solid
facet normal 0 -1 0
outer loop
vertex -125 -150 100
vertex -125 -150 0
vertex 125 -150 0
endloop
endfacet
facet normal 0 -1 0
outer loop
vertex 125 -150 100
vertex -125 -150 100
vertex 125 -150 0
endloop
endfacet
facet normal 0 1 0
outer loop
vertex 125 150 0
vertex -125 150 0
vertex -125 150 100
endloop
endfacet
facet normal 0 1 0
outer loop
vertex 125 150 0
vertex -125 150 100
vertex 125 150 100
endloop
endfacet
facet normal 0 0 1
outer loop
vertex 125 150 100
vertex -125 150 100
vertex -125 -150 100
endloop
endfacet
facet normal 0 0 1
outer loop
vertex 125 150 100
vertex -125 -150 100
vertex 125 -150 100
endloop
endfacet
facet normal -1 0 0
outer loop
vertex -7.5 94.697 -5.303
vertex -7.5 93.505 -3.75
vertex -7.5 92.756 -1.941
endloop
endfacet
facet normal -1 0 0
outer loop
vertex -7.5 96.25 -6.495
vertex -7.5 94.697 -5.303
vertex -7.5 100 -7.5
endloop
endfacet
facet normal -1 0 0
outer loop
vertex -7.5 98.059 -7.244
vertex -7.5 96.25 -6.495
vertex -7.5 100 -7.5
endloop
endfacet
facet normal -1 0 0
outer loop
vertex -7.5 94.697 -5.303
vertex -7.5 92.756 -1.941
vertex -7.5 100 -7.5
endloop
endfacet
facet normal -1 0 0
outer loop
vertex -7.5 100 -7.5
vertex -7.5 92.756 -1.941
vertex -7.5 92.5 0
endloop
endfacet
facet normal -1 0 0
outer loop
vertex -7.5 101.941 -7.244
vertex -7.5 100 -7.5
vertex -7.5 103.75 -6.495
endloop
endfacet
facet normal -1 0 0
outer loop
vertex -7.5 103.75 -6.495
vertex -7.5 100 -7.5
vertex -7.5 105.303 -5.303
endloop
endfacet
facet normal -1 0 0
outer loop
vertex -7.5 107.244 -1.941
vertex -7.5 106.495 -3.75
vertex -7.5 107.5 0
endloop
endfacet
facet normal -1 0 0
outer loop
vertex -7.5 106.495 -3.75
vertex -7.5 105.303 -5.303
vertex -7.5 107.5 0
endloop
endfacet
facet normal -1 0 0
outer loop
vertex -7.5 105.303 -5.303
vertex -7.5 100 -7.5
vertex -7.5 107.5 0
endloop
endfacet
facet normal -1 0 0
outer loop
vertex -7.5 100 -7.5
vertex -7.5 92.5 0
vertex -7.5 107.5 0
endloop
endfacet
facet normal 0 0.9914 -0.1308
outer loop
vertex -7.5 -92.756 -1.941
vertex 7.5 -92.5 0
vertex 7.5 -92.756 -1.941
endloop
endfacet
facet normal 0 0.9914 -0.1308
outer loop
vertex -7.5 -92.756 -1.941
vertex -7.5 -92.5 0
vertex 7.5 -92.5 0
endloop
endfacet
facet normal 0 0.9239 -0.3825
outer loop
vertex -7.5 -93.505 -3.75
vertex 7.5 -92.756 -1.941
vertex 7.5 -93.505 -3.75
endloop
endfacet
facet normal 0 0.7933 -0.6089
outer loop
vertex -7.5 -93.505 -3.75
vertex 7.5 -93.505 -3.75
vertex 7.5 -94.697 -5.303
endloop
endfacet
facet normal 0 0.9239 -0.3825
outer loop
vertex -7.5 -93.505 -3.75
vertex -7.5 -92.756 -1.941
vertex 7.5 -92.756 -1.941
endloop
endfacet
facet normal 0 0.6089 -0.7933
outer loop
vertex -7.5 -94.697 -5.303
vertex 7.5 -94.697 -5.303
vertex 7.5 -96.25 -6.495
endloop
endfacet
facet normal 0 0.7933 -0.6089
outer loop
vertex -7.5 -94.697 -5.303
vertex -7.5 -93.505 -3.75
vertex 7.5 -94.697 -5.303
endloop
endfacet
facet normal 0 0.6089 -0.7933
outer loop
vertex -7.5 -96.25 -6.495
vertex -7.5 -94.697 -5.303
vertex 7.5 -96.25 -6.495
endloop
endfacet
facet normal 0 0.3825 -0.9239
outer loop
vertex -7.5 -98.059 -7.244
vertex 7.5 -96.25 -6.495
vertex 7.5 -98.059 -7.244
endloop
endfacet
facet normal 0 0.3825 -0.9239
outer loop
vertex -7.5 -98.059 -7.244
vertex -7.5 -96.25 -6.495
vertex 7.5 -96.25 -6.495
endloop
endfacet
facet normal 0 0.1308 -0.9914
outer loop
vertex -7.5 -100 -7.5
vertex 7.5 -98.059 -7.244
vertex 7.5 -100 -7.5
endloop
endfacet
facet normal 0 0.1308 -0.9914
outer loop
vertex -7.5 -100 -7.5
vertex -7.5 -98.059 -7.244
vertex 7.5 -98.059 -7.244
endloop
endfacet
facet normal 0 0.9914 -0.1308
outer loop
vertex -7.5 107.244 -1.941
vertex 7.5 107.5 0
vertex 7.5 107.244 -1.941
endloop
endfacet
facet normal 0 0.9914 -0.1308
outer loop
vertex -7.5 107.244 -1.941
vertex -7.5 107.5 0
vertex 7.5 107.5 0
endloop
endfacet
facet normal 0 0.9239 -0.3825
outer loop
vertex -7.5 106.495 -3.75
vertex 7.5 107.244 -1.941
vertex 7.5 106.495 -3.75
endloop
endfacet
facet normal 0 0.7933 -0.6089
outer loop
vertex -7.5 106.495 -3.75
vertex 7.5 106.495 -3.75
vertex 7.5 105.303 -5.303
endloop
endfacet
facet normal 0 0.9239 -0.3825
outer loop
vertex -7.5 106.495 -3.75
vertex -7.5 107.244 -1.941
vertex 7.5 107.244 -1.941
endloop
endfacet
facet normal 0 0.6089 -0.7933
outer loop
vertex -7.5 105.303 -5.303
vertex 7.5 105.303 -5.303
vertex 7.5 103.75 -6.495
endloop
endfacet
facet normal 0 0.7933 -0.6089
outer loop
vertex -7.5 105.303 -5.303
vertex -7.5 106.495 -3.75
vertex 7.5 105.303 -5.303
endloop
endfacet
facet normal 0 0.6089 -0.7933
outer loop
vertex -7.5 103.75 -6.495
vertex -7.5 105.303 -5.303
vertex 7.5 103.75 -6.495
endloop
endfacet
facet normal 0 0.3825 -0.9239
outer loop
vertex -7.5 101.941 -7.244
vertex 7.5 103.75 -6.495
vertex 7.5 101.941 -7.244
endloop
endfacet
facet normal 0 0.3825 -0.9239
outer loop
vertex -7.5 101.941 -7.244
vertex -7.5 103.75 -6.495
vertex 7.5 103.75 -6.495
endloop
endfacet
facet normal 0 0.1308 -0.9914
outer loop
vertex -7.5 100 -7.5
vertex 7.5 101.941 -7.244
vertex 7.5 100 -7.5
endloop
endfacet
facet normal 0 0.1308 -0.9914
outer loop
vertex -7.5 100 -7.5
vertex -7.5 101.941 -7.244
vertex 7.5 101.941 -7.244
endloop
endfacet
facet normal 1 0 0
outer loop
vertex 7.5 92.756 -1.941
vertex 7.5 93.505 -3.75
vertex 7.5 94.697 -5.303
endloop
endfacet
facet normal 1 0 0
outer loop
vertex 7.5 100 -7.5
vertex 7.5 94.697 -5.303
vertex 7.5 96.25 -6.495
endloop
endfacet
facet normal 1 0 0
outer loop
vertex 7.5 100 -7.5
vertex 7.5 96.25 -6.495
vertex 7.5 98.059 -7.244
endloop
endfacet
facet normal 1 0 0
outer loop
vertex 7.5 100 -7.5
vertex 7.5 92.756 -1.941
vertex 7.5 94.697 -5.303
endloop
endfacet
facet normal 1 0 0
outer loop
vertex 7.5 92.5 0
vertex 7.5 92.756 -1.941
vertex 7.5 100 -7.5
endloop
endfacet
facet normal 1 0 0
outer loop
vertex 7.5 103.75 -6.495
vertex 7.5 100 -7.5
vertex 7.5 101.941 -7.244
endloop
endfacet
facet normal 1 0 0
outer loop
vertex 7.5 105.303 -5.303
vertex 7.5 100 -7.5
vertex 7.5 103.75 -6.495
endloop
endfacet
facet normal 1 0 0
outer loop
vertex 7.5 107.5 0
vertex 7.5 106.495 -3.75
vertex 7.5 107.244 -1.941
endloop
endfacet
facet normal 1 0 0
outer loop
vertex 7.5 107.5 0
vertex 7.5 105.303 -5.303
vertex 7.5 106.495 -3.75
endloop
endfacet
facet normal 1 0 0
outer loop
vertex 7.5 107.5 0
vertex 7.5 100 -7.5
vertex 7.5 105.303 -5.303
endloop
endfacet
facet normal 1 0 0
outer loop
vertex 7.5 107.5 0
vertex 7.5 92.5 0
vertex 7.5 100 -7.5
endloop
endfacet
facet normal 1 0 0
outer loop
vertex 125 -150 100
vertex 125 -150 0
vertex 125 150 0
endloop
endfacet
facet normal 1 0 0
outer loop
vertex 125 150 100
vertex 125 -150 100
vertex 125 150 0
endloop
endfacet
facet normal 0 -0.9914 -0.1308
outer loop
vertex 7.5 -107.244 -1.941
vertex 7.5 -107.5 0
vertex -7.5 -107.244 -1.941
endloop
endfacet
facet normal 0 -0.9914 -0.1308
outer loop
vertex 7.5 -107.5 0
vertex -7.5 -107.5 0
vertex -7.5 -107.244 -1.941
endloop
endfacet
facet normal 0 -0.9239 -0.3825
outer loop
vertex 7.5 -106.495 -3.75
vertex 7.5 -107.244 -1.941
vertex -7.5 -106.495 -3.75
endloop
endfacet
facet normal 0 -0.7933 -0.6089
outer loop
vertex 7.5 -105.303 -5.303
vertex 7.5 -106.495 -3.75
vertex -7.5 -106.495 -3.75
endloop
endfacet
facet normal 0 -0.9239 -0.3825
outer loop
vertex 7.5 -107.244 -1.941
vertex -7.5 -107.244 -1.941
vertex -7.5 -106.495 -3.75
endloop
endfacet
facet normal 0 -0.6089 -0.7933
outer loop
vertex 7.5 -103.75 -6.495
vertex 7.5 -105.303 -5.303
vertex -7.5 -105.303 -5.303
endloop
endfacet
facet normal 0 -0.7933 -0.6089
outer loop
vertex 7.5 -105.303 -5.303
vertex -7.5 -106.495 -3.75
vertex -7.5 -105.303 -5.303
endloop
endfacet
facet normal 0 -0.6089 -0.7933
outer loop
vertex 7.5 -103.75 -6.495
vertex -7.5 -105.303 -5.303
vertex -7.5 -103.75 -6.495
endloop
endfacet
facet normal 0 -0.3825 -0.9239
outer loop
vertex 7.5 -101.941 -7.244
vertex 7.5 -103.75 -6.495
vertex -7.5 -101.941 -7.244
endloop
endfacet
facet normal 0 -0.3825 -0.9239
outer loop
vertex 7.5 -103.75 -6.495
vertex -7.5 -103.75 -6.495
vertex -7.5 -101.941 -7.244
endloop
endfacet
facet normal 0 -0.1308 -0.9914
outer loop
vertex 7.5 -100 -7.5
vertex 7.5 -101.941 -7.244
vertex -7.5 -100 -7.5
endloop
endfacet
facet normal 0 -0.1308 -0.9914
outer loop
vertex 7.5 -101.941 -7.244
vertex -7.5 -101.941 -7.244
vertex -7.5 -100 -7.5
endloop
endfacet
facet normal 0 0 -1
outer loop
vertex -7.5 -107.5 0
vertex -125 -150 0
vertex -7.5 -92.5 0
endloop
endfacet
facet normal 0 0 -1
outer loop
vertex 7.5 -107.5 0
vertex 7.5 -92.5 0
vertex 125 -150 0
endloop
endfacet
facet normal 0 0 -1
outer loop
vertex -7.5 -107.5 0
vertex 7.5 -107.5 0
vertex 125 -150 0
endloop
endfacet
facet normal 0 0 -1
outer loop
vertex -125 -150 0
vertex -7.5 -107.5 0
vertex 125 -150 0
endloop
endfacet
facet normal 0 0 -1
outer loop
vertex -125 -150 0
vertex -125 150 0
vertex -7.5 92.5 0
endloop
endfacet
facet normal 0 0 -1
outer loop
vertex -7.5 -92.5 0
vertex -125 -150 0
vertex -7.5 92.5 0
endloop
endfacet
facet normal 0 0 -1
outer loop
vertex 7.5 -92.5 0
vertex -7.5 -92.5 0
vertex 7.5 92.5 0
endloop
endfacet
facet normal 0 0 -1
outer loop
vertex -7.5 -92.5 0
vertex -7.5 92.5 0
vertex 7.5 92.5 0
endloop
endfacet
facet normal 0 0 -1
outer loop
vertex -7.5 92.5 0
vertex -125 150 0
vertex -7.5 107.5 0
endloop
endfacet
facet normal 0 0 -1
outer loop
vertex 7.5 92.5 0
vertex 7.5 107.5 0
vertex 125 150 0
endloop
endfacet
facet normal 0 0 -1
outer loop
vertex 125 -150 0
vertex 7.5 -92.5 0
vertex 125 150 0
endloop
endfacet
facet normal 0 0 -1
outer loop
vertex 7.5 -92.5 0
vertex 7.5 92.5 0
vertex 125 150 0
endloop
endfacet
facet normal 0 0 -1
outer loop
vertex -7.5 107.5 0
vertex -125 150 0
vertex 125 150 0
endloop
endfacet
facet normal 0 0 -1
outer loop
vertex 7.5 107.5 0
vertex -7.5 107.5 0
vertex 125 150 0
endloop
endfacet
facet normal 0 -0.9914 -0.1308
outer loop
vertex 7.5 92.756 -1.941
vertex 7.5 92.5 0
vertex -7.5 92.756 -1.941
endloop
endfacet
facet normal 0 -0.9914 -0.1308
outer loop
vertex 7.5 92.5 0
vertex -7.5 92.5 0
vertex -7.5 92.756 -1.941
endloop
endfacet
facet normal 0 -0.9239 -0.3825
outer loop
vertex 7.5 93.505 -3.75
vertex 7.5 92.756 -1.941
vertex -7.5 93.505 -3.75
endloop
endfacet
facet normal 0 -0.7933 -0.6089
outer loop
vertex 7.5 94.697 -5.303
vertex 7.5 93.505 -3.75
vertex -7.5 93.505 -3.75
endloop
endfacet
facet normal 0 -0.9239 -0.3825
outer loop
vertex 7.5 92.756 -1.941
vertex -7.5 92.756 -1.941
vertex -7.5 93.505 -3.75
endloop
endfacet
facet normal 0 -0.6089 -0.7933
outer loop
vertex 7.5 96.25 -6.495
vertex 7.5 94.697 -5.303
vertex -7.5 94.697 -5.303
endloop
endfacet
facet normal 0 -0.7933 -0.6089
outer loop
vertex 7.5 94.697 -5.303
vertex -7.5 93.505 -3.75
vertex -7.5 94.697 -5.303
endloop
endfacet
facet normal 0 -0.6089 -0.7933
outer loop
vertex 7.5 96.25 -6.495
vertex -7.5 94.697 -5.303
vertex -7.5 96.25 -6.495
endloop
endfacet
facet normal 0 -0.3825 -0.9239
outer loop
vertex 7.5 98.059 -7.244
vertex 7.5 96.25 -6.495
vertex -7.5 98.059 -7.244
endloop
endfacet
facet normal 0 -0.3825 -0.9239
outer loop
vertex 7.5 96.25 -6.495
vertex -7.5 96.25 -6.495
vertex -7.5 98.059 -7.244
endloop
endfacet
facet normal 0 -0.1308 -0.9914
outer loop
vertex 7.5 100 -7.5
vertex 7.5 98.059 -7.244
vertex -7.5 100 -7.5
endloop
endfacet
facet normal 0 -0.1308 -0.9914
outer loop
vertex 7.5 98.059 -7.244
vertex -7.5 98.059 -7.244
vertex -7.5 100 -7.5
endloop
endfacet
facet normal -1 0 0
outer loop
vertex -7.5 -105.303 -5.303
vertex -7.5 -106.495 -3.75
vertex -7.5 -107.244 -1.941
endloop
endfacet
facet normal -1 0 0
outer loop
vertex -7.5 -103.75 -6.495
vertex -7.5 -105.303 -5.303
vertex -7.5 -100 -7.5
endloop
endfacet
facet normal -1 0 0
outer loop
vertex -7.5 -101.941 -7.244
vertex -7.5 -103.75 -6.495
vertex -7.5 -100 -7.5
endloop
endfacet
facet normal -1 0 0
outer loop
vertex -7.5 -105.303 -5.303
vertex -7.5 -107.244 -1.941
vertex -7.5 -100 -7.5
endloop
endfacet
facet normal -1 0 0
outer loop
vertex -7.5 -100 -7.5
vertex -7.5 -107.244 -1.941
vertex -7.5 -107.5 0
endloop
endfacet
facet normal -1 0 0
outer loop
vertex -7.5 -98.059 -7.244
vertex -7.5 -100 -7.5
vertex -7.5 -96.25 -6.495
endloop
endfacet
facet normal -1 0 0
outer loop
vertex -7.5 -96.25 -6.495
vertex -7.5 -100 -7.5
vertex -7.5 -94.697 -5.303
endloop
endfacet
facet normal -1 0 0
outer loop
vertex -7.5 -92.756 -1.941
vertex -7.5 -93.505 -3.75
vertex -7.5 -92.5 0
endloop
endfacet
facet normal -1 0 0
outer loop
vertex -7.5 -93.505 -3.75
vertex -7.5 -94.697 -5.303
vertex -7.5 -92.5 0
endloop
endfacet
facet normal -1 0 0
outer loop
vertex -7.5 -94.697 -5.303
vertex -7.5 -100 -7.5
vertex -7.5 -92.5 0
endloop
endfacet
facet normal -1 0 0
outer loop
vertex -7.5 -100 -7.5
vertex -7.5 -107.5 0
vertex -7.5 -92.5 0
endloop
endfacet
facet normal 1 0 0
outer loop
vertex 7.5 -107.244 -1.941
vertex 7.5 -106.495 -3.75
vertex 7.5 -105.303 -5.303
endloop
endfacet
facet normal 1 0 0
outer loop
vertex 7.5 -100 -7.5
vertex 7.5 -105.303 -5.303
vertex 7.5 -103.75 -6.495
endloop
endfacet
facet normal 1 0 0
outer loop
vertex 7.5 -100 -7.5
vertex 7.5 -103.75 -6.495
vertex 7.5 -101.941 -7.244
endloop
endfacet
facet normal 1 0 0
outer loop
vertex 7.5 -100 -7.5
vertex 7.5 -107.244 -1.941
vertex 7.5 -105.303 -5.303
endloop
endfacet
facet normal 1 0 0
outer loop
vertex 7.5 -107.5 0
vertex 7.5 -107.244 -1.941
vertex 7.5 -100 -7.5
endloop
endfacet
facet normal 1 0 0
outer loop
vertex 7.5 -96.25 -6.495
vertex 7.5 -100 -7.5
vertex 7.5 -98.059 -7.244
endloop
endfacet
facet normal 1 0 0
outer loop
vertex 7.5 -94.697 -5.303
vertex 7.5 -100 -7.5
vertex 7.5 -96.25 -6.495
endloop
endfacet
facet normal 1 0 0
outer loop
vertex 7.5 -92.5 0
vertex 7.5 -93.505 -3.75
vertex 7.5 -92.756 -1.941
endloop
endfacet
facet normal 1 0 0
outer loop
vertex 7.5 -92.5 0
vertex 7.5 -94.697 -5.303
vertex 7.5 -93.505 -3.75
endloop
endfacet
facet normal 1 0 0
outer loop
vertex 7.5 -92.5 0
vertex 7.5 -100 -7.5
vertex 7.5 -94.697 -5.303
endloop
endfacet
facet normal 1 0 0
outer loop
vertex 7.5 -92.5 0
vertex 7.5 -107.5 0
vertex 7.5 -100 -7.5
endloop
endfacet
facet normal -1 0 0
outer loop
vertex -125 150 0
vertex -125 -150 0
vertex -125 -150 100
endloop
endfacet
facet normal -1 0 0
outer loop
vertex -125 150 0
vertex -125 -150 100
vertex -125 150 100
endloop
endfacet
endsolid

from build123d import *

# Parameters (mm, degrees)
SKETCH1_W           = 250
SKETCH1_H           = 300
BOSS_EXTRUDE1_DEPTH = 100
SKETCH2_W           = 15
SKETCH2_H           = 15
BOSS_EXTRUDE2_DEPTH = 7.5
FILLET1_R           = 7.5


with BuildPart() as part:
    # Sketch1 → Boss-Extrude1 (new body)
    with BuildSketch(Plane.XY):
        Rectangle(SKETCH1_W, SKETCH1_H)
    extrude(amount=BOSS_EXTRUDE1_DEPTH)

    # Sketch2 → Boss-Extrude2 (add)
    with BuildSketch(Plane(origin=(0, 0, 0), x_dir=(-1, 0, 0), z_dir=(0, 0, -1))):
        with Locations((0, 100)):
            Rectangle(SKETCH2_W, SKETCH2_H)
        with Locations((0, -100)):
            Rectangle(SKETCH2_W, SKETCH2_H)
    extrude(amount=BOSS_EXTRUDE2_DEPTH)

    # Fillet1
    fillet1_edges = [part.edges().sort_by_distance(p)[0] for p in [
        (0, 107.5, -7.5),
        (0, 92.5, -7.5),
        (0, -107.5, -7.5),
        (0, -92.5, -7.5),
    ]]
    fillet(fillet1_edges, radius=FILLET1_R - 0.0001)  # a hair under: the kernel refuses the full size


solid = part.part
